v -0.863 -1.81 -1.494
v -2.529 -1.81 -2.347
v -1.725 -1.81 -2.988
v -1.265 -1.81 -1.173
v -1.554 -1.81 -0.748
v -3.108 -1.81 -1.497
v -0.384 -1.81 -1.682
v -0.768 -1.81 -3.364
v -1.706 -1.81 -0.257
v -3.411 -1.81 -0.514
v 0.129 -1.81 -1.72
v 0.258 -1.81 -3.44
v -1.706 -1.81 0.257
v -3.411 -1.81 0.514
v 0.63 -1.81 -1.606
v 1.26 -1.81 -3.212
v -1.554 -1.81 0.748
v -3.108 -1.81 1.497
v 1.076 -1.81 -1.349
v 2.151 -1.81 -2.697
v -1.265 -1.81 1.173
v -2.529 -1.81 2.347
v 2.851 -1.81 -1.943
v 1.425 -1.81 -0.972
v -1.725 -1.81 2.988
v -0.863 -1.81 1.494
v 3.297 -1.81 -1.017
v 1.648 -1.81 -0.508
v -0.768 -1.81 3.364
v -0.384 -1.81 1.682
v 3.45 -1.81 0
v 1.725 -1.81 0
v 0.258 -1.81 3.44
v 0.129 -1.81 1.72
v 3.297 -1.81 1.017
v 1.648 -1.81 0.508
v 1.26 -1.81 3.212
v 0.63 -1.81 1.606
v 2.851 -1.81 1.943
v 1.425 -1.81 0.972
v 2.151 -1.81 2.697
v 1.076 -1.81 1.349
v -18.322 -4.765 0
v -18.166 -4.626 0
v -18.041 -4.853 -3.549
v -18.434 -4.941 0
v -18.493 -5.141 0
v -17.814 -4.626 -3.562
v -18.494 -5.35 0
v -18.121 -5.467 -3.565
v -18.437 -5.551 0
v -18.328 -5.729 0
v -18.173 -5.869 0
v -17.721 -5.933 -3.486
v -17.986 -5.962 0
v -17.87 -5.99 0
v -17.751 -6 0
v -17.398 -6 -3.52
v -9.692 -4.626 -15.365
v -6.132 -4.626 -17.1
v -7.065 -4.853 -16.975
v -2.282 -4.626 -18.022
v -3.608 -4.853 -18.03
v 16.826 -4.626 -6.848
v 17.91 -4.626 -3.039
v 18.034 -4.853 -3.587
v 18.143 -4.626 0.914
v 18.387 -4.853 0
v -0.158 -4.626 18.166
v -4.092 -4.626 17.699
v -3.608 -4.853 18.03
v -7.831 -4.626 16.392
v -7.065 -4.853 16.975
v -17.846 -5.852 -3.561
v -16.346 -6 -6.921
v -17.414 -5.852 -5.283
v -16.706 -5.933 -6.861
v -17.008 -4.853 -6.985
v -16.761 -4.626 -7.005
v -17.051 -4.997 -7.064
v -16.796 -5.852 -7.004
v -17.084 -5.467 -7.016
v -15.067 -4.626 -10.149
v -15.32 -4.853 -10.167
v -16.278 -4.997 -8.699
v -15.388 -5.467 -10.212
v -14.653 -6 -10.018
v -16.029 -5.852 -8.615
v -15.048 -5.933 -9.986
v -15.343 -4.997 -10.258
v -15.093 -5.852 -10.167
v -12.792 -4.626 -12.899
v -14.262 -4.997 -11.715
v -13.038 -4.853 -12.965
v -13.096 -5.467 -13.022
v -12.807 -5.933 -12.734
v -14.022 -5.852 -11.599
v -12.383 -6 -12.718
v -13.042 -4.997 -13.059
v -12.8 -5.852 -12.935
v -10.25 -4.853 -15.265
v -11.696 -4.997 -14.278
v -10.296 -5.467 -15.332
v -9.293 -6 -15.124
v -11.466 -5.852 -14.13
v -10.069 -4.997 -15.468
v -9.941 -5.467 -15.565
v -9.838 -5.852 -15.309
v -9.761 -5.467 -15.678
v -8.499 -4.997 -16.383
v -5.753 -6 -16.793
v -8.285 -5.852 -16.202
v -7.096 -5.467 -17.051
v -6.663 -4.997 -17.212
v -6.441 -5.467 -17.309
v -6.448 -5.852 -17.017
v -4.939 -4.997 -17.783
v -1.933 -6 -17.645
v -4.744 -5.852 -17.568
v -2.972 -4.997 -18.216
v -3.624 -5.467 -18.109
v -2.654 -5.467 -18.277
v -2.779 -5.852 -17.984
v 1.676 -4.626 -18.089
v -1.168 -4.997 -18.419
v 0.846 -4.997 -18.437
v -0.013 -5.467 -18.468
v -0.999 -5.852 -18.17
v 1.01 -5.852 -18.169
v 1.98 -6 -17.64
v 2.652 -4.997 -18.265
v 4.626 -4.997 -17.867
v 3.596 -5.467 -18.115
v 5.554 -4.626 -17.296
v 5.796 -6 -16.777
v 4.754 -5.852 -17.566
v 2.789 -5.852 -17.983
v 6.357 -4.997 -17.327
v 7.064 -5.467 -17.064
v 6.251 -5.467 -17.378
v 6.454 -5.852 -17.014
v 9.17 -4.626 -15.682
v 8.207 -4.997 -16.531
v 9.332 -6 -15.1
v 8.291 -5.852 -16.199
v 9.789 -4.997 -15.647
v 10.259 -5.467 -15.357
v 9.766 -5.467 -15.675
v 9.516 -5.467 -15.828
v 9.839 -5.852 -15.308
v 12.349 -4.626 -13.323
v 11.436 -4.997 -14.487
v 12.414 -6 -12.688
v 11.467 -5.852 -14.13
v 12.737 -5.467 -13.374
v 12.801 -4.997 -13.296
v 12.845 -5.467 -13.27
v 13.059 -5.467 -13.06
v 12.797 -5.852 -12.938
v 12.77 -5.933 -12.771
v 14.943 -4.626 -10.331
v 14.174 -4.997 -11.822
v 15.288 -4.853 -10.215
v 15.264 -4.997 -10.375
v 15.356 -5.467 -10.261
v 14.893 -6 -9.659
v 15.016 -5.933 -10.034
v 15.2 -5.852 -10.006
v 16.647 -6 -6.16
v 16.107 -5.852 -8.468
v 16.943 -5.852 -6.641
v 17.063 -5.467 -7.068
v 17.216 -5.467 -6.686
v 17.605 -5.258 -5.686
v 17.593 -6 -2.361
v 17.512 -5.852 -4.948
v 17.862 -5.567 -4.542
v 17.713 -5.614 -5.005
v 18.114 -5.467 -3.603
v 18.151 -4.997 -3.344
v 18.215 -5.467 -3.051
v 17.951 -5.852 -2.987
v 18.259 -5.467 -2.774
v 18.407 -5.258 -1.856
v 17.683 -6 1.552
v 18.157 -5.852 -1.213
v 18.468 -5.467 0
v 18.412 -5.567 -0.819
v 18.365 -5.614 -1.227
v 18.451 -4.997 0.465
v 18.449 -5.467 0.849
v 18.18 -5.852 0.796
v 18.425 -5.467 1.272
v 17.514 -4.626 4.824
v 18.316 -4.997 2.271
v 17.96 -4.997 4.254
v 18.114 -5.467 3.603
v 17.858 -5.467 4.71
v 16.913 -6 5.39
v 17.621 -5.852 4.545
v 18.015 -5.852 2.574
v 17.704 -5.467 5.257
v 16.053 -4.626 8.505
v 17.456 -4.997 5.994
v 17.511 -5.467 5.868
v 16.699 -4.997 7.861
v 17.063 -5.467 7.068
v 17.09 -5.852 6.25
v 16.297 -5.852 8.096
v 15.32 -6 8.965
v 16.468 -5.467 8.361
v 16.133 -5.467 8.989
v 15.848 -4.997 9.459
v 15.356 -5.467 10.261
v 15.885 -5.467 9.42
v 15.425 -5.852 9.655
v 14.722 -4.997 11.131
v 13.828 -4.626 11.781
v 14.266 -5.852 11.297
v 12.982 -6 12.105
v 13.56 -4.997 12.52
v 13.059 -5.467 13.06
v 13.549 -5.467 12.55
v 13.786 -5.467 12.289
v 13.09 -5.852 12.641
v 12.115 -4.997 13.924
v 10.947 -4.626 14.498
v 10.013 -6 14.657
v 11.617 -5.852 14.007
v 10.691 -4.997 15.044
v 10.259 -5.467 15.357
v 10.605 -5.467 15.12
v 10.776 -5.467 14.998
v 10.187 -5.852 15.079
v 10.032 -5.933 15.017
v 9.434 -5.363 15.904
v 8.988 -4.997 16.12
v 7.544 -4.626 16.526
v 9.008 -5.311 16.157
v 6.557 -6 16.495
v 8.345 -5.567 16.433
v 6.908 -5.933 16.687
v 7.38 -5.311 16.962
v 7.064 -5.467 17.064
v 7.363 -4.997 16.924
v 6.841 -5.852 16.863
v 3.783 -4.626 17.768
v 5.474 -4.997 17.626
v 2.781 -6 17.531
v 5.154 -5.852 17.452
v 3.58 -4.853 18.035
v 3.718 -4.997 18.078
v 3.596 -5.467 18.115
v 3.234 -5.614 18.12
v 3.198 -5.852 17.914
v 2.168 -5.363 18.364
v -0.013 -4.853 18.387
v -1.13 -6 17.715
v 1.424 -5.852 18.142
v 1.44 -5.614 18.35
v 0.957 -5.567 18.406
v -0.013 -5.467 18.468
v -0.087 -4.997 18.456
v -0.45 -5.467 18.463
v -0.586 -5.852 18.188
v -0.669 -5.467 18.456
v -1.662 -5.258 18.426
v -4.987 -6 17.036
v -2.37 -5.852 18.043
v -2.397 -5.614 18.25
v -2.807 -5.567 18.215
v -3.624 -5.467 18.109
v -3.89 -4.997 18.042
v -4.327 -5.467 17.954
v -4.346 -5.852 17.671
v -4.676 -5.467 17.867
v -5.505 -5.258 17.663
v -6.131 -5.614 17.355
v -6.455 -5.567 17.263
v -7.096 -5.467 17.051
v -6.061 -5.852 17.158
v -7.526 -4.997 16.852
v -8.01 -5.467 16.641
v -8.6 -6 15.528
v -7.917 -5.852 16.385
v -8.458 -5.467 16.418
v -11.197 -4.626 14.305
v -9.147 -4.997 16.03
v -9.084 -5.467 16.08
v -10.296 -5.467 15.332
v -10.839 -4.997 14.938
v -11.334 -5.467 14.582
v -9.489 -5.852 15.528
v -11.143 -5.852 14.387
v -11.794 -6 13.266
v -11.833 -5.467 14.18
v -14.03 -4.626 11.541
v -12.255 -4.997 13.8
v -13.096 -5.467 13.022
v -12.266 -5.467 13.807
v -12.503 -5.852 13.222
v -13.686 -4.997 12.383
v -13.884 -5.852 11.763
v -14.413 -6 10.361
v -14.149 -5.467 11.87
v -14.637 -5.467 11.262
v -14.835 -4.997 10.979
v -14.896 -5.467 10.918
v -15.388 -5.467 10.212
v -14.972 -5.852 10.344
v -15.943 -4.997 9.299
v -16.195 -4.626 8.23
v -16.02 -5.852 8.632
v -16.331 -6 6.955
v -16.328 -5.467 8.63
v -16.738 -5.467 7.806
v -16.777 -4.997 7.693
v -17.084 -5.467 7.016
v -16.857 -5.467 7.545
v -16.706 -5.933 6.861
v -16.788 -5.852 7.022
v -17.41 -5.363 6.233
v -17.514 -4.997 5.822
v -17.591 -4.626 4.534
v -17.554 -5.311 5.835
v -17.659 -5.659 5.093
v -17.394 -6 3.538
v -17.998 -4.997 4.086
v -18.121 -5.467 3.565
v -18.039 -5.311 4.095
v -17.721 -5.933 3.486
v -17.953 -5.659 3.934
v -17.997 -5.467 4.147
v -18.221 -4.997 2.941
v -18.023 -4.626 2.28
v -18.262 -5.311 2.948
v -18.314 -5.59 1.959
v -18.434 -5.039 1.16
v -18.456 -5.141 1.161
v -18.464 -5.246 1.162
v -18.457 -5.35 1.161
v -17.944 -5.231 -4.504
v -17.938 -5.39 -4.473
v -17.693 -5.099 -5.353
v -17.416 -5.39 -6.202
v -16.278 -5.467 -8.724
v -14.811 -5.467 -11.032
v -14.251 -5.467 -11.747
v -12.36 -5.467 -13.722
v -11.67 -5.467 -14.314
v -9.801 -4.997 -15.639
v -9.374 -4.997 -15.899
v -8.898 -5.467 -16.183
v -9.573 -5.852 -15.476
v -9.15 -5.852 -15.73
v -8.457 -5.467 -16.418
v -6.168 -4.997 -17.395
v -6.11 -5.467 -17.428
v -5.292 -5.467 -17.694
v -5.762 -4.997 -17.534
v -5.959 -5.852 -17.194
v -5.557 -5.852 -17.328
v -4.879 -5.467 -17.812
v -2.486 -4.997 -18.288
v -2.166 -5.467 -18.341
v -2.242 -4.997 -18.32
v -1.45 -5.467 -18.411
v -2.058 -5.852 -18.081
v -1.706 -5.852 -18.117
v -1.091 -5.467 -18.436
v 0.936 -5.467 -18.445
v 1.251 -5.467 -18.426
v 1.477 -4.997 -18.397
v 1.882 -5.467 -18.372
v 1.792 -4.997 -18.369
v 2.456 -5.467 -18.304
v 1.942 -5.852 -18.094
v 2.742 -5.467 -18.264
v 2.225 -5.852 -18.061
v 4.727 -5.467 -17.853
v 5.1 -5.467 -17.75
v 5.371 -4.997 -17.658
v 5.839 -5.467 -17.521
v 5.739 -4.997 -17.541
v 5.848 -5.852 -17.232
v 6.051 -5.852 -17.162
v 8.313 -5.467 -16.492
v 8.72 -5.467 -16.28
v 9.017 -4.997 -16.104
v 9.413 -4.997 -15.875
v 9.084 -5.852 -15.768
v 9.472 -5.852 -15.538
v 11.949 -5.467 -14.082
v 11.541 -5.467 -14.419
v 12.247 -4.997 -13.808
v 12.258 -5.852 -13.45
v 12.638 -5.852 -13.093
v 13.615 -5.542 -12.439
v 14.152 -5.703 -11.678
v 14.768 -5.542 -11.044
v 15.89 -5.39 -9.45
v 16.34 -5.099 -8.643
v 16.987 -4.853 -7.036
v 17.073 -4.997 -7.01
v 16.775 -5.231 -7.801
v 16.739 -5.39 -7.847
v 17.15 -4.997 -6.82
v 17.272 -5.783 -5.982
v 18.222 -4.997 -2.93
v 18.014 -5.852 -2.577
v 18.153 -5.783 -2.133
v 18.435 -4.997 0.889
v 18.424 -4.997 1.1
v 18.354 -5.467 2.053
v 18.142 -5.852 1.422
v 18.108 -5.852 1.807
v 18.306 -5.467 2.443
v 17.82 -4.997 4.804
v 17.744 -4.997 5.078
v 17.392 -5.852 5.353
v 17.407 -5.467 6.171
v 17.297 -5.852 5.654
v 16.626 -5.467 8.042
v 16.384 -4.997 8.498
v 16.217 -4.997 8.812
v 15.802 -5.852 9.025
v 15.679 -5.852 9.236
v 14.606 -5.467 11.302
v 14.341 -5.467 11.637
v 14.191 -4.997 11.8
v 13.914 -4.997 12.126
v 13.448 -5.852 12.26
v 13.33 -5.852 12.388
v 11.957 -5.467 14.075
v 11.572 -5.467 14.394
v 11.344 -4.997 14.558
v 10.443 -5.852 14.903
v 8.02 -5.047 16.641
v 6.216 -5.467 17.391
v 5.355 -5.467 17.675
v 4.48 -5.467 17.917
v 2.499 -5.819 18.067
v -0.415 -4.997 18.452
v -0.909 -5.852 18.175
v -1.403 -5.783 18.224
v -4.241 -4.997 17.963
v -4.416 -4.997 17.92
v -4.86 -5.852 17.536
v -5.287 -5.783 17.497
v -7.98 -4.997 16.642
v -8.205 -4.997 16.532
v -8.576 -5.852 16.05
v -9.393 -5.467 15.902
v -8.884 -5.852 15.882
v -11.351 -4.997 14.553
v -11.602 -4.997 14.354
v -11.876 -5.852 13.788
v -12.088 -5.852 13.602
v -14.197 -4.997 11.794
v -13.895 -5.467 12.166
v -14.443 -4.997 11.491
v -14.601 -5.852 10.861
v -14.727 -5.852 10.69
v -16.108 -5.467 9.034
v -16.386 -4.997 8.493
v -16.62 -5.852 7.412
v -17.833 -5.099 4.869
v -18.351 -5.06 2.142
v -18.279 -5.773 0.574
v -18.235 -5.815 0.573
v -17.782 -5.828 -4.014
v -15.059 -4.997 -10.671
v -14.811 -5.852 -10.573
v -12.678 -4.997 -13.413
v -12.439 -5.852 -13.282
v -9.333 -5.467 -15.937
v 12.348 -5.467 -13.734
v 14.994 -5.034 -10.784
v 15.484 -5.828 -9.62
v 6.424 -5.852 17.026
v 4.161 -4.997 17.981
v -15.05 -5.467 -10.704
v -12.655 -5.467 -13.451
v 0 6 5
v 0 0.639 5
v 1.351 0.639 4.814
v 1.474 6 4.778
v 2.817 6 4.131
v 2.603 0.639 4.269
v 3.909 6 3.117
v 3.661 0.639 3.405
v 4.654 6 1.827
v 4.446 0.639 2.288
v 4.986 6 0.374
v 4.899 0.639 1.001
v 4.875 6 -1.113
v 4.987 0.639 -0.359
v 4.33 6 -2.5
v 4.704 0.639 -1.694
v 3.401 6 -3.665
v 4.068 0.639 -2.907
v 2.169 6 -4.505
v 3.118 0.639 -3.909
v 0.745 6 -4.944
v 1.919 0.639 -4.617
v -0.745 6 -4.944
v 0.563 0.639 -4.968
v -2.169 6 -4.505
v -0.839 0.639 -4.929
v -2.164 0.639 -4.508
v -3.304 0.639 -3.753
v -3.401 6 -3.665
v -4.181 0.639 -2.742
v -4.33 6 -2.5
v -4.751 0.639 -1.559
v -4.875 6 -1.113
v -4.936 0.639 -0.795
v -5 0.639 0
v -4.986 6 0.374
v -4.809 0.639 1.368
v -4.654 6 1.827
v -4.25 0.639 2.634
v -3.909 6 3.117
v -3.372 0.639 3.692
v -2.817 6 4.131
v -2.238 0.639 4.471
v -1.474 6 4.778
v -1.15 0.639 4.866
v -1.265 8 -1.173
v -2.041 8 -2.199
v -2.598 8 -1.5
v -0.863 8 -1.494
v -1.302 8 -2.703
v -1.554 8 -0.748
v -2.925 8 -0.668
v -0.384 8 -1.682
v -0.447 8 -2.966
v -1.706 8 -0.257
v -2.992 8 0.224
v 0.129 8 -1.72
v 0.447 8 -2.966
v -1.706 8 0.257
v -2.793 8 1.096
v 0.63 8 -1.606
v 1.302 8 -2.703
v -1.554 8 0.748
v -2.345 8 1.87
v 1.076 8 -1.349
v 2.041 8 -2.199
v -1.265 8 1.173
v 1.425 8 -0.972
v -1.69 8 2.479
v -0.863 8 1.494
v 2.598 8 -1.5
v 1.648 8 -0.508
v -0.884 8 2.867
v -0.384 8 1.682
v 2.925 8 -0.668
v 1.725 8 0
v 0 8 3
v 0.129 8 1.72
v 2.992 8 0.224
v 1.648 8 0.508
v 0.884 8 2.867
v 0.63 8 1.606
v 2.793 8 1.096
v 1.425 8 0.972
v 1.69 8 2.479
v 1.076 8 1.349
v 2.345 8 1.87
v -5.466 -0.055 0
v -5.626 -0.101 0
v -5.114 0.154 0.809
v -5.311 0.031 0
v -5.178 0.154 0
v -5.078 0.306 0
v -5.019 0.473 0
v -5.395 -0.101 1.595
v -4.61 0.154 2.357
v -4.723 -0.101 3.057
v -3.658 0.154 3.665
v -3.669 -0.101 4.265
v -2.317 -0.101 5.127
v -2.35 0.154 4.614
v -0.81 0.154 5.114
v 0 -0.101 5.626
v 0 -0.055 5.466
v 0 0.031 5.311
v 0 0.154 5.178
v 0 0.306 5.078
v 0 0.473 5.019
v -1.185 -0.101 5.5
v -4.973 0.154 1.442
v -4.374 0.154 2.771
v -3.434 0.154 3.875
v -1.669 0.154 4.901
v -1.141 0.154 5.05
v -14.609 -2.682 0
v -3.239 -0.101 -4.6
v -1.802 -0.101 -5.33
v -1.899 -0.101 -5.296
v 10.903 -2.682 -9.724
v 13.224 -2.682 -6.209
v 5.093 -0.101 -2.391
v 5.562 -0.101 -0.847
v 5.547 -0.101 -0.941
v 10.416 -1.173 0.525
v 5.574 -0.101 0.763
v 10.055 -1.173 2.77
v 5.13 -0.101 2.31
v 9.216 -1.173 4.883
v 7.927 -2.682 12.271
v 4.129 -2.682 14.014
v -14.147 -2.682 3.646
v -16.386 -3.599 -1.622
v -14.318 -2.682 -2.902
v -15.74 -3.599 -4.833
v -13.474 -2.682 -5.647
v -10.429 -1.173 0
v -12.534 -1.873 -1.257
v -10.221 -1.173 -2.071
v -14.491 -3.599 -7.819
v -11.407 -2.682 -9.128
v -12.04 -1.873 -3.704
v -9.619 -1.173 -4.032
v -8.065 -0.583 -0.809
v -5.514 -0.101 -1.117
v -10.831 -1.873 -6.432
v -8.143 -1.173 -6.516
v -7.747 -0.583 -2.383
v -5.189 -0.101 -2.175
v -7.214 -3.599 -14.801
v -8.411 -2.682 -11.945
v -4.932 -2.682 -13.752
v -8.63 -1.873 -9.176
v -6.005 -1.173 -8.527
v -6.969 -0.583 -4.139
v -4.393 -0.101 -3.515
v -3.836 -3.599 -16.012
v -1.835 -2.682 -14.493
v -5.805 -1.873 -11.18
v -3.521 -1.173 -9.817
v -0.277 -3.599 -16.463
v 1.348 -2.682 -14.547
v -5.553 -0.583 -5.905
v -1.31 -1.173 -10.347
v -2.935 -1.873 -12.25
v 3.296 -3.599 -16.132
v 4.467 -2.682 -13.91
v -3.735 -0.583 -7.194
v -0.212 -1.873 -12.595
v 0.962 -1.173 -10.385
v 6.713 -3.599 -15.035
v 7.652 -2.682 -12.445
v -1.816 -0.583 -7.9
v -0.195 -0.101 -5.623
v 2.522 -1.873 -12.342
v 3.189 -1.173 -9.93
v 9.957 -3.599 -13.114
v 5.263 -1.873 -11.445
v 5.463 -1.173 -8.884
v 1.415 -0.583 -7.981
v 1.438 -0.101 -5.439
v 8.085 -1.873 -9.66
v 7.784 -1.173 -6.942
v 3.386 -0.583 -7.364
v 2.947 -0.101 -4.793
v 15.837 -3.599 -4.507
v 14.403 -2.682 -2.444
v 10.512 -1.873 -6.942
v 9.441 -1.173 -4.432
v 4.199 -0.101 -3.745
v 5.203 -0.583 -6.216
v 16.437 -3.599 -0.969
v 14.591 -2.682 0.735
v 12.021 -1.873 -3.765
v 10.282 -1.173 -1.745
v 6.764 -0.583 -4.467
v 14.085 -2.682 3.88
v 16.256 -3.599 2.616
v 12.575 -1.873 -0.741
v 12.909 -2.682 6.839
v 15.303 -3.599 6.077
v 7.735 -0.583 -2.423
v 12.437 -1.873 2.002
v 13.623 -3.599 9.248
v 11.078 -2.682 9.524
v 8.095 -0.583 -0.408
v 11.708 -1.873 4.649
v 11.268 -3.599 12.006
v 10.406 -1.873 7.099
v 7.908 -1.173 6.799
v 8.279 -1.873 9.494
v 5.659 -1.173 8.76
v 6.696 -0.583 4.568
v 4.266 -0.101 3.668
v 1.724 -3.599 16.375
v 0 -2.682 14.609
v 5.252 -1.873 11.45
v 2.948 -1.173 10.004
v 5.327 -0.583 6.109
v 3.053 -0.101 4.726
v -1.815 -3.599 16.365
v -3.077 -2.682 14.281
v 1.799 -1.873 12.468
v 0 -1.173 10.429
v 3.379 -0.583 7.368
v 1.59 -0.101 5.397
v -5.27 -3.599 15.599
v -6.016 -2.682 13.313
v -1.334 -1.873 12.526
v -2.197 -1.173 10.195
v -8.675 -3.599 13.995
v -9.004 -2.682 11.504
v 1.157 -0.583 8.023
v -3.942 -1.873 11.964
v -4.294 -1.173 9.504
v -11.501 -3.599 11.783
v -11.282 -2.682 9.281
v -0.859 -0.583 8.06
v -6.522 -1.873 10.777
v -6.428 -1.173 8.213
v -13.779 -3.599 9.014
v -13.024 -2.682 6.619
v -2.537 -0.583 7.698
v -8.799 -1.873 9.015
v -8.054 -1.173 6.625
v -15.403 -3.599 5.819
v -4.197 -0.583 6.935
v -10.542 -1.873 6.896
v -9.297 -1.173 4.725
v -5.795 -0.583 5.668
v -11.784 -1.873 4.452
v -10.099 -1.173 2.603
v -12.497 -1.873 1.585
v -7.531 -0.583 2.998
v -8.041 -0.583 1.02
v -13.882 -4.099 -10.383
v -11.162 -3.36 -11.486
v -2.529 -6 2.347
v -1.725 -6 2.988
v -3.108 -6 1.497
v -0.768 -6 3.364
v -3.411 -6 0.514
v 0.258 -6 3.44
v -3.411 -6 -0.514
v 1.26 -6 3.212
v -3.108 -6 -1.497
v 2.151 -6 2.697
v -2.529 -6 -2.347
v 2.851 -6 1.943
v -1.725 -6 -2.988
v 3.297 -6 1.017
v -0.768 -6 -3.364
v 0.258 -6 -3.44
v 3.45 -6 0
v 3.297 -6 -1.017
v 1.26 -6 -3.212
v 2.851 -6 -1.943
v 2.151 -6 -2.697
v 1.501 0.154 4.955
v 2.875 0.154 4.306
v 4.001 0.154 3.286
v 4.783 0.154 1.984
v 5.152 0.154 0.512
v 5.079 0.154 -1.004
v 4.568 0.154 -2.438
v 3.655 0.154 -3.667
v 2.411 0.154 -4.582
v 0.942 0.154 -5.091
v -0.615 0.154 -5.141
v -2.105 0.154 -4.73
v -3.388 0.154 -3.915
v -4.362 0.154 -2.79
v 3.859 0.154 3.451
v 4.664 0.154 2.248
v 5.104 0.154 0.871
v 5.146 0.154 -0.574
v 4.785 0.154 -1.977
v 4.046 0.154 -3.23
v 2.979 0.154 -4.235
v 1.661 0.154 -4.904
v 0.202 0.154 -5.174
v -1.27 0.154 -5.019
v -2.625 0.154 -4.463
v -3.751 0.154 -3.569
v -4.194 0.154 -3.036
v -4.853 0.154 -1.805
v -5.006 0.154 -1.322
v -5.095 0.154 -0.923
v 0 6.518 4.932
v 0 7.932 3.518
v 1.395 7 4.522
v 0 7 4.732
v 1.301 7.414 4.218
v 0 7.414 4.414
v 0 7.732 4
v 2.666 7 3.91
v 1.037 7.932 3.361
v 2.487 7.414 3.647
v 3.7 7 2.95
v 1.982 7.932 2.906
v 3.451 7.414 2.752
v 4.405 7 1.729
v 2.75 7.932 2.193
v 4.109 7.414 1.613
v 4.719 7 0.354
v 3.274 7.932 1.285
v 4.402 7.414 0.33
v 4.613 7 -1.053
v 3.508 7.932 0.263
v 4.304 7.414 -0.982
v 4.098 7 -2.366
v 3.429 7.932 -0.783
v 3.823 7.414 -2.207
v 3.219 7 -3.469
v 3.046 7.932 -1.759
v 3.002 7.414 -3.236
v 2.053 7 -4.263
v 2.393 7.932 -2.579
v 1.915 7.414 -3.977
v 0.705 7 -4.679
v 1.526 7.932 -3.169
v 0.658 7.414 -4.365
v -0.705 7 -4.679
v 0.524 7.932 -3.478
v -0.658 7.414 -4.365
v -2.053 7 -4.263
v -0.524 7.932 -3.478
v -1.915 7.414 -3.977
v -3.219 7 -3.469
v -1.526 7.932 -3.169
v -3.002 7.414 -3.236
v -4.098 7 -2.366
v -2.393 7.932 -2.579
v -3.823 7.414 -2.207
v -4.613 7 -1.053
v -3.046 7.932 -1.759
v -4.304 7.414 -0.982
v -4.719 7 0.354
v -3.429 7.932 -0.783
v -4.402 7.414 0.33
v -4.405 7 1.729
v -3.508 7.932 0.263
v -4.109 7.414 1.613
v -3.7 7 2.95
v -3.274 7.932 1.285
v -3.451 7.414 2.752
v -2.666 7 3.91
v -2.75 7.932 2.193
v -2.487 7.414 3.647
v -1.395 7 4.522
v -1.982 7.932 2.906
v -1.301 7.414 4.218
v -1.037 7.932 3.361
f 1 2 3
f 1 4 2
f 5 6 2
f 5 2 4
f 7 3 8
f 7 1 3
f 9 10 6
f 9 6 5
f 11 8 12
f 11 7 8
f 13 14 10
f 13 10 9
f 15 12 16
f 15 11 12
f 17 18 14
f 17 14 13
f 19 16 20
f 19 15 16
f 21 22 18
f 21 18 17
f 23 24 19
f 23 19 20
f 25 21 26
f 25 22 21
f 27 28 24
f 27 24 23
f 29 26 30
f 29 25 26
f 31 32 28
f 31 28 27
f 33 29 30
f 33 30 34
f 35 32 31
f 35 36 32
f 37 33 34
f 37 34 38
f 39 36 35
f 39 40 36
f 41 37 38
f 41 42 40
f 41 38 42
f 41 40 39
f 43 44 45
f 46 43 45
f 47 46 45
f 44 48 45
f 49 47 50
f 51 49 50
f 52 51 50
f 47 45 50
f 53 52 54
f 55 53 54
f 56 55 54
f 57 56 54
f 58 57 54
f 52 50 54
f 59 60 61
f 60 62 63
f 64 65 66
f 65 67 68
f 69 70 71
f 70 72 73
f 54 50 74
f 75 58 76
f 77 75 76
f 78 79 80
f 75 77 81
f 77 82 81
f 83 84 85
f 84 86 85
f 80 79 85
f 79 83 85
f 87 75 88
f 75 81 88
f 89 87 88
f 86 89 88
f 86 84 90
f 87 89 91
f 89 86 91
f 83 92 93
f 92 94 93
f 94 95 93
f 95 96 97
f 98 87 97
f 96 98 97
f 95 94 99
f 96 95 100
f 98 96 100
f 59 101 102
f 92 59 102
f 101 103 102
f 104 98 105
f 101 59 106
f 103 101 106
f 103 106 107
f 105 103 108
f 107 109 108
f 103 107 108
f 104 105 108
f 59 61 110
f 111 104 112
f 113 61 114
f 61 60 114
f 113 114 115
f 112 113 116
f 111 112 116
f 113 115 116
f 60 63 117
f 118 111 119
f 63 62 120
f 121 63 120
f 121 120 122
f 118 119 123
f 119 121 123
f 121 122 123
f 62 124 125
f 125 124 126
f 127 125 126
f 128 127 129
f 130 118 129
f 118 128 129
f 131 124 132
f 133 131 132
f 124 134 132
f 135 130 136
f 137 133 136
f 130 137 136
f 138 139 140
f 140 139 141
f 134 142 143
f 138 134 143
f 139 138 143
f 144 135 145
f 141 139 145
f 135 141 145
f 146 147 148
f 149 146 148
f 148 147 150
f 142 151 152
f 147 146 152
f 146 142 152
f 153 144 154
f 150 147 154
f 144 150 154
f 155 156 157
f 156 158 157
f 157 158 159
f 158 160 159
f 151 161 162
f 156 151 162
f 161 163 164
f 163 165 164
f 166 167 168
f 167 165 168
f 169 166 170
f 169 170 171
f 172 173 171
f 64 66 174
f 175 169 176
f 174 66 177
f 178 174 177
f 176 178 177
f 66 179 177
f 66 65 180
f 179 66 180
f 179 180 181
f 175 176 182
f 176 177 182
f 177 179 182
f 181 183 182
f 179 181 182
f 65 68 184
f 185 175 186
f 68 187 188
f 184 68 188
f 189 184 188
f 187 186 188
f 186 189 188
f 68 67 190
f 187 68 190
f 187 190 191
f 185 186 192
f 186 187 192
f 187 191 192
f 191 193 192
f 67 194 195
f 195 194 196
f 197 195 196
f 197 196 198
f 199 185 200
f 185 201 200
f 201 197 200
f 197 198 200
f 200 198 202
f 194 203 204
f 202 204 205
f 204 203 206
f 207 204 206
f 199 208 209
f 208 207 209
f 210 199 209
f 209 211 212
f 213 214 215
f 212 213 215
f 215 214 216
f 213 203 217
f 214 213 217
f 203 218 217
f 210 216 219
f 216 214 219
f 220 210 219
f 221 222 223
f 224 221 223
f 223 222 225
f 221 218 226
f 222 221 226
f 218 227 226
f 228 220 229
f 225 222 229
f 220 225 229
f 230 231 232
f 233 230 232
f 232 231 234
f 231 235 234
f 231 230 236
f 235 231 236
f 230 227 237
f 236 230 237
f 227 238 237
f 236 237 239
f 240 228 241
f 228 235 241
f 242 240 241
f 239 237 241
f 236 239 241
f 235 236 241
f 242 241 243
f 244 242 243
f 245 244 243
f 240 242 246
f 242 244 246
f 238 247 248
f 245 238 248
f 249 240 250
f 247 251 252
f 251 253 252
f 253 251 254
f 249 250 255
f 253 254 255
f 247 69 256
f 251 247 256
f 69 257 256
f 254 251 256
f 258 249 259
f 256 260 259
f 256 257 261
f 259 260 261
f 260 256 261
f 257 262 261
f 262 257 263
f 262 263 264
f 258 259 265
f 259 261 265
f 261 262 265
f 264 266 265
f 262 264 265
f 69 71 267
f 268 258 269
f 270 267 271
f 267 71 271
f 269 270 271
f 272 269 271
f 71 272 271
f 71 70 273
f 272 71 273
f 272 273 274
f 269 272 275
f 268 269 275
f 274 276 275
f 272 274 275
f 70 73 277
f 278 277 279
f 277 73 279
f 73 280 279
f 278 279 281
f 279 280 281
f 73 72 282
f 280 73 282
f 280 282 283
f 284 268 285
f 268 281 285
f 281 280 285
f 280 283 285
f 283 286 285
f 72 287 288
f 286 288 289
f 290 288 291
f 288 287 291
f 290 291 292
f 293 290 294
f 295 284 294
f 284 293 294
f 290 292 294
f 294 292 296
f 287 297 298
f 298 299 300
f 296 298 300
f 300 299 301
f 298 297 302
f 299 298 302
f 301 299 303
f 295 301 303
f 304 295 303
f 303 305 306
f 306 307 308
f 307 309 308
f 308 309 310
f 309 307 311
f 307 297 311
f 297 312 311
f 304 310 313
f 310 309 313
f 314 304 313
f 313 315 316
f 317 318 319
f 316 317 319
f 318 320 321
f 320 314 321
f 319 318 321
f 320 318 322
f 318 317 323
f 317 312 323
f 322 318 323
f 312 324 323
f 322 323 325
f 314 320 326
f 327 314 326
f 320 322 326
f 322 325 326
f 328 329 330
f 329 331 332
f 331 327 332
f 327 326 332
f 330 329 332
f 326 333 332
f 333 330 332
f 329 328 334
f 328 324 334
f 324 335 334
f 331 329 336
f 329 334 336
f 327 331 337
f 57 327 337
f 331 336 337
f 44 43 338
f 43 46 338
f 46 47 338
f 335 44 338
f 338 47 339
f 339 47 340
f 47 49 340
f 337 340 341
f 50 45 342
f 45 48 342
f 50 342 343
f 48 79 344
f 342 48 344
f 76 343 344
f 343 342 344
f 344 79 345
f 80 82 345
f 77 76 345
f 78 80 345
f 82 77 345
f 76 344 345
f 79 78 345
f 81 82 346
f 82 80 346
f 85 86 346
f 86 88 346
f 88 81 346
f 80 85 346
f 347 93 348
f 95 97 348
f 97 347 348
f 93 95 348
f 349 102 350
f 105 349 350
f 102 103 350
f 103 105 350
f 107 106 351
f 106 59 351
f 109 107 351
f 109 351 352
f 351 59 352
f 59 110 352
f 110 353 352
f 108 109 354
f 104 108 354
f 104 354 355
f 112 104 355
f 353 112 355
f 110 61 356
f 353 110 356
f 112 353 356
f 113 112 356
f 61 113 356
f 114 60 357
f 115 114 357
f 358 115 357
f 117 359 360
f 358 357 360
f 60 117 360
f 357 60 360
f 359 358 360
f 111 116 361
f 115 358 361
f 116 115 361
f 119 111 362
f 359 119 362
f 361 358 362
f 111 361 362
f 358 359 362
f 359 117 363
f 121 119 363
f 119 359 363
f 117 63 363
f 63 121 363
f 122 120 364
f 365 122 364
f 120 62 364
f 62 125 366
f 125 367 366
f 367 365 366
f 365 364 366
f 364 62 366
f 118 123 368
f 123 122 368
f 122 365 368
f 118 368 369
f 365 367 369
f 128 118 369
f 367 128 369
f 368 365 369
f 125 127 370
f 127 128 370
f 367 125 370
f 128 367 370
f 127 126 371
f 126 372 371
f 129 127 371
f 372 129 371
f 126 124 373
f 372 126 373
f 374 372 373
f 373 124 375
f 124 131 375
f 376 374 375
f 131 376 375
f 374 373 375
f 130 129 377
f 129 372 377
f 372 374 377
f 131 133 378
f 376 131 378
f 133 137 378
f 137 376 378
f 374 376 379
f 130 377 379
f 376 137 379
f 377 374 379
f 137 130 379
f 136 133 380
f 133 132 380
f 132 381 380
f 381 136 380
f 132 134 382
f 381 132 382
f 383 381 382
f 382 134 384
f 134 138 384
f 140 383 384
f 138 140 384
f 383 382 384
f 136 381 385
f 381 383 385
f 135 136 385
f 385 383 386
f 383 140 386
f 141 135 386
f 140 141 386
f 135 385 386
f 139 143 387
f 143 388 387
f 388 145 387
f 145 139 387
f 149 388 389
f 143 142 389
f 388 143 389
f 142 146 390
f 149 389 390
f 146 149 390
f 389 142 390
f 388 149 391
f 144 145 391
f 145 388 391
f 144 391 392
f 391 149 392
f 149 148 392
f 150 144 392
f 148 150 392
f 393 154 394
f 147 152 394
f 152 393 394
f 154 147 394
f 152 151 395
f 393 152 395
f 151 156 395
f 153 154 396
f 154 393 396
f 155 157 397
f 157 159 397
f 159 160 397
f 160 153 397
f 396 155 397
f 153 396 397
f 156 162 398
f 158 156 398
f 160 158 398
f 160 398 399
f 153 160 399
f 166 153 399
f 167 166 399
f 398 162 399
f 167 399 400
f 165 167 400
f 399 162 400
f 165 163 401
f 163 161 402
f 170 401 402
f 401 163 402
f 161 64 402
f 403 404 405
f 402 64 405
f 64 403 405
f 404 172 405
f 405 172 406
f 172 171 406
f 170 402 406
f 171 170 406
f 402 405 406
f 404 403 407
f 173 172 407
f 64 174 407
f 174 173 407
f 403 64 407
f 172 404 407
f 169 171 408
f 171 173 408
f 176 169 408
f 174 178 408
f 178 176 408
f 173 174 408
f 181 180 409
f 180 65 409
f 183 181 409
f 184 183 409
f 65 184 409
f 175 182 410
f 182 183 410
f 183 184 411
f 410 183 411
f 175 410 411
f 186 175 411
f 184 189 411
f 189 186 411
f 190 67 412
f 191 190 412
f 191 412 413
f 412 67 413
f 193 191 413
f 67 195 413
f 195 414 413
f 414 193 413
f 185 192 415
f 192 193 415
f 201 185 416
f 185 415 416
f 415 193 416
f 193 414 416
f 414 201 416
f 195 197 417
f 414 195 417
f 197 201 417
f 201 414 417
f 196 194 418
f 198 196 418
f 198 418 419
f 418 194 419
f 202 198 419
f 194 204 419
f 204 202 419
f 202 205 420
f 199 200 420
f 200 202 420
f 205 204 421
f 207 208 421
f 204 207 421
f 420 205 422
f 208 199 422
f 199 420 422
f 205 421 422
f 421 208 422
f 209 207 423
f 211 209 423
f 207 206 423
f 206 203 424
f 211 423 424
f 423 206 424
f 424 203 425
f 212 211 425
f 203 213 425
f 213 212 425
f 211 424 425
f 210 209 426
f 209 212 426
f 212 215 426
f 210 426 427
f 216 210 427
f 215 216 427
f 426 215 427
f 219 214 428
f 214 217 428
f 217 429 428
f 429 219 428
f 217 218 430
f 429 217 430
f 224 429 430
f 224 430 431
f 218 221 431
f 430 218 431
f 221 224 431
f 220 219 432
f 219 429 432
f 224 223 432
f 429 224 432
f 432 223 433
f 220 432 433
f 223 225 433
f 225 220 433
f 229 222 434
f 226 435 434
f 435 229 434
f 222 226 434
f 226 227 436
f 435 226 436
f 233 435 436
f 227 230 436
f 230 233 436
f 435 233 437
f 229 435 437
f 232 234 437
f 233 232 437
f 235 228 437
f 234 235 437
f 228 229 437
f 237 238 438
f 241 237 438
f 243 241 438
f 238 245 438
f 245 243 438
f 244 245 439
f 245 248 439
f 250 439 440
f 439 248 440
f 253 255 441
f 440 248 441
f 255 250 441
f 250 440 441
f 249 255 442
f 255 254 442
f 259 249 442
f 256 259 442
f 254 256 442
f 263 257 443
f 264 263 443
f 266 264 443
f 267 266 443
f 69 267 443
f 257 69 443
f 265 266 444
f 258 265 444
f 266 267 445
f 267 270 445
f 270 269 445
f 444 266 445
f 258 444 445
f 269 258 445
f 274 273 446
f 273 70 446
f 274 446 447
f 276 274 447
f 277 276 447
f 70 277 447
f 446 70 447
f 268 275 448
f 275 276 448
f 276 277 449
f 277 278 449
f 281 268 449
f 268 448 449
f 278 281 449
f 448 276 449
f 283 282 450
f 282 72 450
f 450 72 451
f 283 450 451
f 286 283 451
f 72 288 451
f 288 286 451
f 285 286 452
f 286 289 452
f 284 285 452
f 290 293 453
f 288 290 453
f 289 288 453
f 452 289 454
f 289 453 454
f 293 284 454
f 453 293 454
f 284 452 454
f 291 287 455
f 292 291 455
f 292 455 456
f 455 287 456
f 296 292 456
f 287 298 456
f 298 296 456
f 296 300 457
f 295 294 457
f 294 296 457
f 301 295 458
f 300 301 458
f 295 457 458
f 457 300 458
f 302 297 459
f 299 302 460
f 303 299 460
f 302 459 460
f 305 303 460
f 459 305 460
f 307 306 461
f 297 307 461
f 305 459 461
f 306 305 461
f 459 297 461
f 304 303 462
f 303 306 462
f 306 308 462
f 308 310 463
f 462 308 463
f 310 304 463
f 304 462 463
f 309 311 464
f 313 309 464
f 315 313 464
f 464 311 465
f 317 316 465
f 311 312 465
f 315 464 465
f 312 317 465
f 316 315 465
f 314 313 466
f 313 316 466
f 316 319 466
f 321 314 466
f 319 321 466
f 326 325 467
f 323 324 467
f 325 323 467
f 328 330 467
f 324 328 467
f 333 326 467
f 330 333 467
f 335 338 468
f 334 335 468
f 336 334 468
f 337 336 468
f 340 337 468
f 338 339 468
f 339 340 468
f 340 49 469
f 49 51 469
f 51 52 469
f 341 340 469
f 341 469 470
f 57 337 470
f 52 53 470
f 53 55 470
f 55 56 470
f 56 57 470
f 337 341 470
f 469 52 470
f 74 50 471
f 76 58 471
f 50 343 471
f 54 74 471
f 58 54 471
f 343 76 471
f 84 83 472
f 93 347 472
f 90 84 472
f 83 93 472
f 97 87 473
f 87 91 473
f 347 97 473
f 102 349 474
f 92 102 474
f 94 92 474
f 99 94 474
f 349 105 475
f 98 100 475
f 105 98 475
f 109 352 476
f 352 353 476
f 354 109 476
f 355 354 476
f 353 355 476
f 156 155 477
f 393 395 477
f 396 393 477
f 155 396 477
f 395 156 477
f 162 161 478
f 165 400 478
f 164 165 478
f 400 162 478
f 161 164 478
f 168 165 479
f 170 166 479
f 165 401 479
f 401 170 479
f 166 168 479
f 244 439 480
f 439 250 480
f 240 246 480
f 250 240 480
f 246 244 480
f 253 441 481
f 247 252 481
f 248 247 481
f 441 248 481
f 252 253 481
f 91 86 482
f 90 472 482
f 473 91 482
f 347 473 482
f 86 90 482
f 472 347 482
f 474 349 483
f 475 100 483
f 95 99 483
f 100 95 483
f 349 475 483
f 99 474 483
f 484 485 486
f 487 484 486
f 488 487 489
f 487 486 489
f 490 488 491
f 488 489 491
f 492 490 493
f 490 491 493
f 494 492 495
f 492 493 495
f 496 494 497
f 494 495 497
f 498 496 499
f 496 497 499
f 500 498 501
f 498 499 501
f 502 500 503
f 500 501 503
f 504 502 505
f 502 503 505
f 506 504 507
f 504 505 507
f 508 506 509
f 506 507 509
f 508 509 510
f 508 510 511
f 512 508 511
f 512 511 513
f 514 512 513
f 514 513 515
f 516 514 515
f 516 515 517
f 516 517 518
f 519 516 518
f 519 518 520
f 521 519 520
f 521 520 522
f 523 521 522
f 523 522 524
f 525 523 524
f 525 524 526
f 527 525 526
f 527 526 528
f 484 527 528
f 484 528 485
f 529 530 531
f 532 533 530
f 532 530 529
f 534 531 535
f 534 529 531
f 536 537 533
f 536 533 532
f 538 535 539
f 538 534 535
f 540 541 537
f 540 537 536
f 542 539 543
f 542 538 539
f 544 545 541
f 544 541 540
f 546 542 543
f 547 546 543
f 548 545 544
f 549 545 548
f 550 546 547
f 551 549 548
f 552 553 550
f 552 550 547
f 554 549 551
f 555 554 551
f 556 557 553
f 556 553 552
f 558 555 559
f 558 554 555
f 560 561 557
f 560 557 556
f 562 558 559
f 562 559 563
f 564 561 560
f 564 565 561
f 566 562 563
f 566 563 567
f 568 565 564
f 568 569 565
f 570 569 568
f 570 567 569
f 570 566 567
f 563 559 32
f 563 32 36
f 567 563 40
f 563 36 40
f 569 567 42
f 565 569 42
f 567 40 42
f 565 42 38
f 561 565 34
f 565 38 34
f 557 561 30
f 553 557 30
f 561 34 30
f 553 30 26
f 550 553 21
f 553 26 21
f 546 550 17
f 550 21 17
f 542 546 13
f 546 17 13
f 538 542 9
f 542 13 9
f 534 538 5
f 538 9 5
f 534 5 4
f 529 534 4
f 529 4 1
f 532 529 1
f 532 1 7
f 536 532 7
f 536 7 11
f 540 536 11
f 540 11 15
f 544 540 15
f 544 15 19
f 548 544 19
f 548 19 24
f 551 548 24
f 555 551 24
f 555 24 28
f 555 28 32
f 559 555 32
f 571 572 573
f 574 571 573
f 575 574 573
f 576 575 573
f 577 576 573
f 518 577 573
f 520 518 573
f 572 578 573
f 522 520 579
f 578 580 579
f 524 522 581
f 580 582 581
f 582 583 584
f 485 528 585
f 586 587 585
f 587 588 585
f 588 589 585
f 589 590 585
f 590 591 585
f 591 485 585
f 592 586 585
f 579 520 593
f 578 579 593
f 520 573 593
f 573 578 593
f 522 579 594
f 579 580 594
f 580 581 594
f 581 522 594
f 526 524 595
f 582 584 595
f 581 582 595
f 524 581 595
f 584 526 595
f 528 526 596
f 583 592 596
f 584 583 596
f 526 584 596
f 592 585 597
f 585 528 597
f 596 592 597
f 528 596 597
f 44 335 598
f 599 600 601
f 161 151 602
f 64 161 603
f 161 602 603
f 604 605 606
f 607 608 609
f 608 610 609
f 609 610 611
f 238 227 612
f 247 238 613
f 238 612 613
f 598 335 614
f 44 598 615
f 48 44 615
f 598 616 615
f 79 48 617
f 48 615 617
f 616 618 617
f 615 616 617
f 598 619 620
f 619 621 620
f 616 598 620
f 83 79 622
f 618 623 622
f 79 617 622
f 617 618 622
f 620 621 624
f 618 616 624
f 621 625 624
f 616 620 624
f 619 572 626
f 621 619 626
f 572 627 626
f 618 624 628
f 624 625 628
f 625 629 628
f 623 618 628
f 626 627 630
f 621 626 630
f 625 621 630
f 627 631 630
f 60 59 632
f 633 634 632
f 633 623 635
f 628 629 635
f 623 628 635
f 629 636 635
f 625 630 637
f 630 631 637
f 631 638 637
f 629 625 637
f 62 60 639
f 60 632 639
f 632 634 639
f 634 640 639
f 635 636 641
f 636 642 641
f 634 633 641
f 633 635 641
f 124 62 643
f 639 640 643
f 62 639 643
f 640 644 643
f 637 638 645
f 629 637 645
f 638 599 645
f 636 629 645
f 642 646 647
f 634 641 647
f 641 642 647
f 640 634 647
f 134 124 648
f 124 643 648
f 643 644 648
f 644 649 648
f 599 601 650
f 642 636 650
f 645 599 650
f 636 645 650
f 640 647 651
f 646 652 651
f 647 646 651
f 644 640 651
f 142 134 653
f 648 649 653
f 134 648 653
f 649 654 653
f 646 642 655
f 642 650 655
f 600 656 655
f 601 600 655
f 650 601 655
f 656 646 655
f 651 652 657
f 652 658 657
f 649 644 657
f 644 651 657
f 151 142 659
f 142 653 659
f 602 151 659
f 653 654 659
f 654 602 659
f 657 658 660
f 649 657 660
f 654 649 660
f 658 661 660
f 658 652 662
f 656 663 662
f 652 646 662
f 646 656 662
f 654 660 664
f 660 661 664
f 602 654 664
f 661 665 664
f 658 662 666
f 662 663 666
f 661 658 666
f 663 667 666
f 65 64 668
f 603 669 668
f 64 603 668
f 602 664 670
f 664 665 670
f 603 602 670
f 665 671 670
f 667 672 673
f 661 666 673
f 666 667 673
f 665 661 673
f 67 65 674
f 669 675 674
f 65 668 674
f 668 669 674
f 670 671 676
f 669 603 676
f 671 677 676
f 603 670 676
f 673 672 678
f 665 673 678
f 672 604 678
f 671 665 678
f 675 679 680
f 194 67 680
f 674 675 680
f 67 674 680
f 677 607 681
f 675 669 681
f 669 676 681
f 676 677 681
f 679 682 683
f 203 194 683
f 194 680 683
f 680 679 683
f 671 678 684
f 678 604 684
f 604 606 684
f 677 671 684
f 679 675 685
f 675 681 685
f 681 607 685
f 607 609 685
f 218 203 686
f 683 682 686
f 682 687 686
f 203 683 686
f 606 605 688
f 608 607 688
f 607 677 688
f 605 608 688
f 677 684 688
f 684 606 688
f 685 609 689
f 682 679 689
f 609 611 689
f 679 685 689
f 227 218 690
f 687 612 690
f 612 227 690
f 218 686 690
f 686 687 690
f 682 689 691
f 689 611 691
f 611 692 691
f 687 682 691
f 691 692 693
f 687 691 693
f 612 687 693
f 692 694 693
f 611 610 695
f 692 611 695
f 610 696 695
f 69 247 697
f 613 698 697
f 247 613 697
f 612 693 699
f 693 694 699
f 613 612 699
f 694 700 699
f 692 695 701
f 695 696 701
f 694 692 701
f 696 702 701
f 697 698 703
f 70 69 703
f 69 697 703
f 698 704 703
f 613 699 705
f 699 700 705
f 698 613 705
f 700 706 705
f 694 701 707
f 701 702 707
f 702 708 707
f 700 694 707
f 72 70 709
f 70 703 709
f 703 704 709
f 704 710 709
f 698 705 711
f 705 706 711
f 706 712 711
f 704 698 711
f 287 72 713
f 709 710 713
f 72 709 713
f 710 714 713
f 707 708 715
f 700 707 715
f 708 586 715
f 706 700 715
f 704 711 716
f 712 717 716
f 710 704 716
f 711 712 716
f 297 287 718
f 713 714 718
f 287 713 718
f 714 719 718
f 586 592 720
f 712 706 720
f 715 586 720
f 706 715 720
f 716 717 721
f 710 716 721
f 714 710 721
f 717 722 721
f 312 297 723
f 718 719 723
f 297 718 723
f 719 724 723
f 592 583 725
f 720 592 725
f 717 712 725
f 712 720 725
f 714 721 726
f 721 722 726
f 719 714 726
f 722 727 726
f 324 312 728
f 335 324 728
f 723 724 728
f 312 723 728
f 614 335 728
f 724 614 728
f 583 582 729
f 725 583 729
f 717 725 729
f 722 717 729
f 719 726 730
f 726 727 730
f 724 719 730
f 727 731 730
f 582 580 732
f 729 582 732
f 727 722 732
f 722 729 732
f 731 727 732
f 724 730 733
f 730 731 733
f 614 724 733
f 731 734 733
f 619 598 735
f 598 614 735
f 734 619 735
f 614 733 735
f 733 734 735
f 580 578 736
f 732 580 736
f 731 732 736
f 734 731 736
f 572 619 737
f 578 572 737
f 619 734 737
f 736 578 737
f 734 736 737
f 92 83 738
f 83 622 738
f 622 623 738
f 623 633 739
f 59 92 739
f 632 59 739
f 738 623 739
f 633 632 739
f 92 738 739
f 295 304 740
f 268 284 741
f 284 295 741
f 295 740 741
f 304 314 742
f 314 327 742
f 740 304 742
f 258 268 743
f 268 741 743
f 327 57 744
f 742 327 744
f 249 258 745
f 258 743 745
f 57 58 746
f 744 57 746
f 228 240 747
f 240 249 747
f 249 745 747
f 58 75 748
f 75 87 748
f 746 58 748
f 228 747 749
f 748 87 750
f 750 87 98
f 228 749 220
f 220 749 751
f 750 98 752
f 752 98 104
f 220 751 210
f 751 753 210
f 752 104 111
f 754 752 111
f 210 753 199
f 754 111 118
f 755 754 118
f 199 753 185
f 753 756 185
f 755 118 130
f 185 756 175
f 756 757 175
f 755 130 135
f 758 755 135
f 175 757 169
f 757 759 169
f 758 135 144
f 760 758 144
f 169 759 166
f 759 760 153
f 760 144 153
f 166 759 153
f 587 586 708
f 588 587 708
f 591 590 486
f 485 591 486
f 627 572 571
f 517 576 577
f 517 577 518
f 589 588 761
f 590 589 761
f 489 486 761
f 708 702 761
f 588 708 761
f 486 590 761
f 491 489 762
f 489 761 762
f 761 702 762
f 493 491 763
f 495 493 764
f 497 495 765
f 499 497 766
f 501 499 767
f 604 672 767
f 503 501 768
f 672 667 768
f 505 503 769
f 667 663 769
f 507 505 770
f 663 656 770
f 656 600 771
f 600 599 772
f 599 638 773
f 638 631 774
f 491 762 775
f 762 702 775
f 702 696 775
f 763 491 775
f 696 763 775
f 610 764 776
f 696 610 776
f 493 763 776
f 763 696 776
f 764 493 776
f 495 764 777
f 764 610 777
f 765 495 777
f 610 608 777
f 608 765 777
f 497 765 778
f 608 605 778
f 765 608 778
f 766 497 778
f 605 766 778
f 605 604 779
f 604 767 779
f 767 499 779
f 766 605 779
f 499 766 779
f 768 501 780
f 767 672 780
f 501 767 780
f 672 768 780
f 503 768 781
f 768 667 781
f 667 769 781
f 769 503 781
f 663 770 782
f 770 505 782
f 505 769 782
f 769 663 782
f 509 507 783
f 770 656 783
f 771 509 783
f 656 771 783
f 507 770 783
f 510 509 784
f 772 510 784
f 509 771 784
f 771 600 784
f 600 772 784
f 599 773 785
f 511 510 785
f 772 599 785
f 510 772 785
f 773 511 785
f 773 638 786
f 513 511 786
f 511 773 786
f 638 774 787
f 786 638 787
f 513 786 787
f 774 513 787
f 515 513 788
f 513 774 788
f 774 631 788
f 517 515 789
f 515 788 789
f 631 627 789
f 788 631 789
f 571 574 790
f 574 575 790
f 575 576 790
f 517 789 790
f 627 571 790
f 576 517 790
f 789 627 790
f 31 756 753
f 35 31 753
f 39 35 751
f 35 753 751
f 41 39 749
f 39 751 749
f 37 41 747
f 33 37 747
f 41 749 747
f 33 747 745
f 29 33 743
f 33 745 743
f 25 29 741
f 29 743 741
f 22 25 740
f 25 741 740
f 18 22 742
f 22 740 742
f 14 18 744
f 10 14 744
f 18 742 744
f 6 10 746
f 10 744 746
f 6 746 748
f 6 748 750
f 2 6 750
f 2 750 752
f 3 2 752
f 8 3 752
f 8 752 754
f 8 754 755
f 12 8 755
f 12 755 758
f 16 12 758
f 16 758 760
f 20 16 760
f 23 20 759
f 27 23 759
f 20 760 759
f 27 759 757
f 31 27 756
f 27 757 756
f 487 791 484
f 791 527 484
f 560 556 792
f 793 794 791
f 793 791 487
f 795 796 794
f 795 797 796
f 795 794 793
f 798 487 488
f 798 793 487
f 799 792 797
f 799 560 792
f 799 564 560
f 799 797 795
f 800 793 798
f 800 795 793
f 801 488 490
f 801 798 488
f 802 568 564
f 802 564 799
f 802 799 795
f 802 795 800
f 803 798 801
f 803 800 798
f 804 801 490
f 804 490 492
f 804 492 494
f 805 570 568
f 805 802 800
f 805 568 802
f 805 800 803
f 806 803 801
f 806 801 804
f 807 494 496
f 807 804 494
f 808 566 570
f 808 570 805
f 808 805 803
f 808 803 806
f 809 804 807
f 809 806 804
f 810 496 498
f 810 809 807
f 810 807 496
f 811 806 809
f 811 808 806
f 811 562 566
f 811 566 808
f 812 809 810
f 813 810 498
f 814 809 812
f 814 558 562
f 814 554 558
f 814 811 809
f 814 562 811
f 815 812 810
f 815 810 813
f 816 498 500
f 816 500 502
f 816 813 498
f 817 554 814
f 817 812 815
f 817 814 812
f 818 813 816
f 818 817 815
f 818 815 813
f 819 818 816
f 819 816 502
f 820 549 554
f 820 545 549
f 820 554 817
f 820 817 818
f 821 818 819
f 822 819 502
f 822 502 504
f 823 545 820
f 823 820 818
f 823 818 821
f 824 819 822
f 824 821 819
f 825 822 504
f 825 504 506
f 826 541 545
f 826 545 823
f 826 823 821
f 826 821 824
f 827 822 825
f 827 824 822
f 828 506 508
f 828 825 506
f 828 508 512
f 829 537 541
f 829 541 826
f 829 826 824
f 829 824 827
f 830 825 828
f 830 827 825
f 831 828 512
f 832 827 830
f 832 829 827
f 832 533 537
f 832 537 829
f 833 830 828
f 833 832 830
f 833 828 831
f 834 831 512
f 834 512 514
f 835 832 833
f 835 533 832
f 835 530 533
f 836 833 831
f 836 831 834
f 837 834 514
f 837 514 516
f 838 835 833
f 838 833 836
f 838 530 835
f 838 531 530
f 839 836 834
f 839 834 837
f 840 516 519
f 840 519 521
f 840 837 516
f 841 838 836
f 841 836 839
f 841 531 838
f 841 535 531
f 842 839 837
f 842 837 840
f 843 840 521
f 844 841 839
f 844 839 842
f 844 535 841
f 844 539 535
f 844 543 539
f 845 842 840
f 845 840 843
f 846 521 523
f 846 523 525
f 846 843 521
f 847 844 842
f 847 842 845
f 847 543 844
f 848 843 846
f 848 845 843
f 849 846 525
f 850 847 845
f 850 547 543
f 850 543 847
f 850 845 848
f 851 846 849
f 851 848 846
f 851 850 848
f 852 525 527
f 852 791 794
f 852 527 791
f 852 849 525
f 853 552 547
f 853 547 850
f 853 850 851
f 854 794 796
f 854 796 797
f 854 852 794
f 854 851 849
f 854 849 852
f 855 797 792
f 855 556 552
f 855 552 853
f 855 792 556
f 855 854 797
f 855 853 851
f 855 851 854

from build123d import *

# Parameters (mm, degrees)
SKETCH1_R           = 5
BOSS_EXTRUDE1_DEPTH = 8
SKETCH3_R           = 3.45
CUT_EXTRUDE1_DEPTH  = 4.19
SKETCH4_R           = 1.725
CUT_EXTRUDE2_DEPTH  = 30.937202742
FILLET1_R           = 0.75
FILLET2_R           = 2


with BuildPart() as part:
    # Sketch1 → Boss-Extrude1 (new body)
    with BuildSketch(Plane(origin=(0, 0, 0), x_dir=(1, 0, 0), z_dir=(0, 1, 0))):
        with Locations(Location((0, 0, 0), (0, 0, 270))):
            Circle(SKETCH1_R)
    extrude(amount=BOSS_EXTRUDE1_DEPTH)

    # Sketch2 → Revolve1 (revolve)
    with BuildSketch(Plane.XY):
        with BuildLine():
            add(Edge.make_bspline(
                [(-20, -6), (-14.656287037, -1.492043213), (-5, 0)],
                knots=[0, 0, 0, 1, 1, 1], degree=2))
            Line((-5, 0), (0, 0))
            Line((0, 0), (0, -6))
            Line((0, -6), (-20, -6))
        make_face()
    revolve(axis=Axis((0, 0, 0), (0, -1, 0)))

    # Sketch3 → Cut-Extrude1 (cut)
    with BuildSketch(Plane.XZ.offset(6)):
        Circle(SKETCH3_R)
    extrude(amount=-CUT_EXTRUDE1_DEPTH, mode=Mode.SUBTRACT)

    # Sketch4 → Cut-Extrude2 (cut, through all)
    with BuildSketch(Plane.XZ.offset(1.81)):
        Circle(SKETCH4_R)
    extrude(amount=-CUT_EXTRUDE2_DEPTH, mode=Mode.SUBTRACT)

    # Fillet1
    fillet1_edges = [part.edges().sort_by_distance(p)[0] for p in [
        (20, -6, 0),
        (3.535533906, 0, -3.535533906),
    ]]
    fillet(fillet1_edges, radius=FILLET1_R)

    # Fillet2
    fillet2_edges = [part.edges().sort_by_distance(p)[0] for p in [
        (0, 8, -5),
    ]]
    fillet(fillet2_edges, radius=FILLET2_R)


solid = part.part
